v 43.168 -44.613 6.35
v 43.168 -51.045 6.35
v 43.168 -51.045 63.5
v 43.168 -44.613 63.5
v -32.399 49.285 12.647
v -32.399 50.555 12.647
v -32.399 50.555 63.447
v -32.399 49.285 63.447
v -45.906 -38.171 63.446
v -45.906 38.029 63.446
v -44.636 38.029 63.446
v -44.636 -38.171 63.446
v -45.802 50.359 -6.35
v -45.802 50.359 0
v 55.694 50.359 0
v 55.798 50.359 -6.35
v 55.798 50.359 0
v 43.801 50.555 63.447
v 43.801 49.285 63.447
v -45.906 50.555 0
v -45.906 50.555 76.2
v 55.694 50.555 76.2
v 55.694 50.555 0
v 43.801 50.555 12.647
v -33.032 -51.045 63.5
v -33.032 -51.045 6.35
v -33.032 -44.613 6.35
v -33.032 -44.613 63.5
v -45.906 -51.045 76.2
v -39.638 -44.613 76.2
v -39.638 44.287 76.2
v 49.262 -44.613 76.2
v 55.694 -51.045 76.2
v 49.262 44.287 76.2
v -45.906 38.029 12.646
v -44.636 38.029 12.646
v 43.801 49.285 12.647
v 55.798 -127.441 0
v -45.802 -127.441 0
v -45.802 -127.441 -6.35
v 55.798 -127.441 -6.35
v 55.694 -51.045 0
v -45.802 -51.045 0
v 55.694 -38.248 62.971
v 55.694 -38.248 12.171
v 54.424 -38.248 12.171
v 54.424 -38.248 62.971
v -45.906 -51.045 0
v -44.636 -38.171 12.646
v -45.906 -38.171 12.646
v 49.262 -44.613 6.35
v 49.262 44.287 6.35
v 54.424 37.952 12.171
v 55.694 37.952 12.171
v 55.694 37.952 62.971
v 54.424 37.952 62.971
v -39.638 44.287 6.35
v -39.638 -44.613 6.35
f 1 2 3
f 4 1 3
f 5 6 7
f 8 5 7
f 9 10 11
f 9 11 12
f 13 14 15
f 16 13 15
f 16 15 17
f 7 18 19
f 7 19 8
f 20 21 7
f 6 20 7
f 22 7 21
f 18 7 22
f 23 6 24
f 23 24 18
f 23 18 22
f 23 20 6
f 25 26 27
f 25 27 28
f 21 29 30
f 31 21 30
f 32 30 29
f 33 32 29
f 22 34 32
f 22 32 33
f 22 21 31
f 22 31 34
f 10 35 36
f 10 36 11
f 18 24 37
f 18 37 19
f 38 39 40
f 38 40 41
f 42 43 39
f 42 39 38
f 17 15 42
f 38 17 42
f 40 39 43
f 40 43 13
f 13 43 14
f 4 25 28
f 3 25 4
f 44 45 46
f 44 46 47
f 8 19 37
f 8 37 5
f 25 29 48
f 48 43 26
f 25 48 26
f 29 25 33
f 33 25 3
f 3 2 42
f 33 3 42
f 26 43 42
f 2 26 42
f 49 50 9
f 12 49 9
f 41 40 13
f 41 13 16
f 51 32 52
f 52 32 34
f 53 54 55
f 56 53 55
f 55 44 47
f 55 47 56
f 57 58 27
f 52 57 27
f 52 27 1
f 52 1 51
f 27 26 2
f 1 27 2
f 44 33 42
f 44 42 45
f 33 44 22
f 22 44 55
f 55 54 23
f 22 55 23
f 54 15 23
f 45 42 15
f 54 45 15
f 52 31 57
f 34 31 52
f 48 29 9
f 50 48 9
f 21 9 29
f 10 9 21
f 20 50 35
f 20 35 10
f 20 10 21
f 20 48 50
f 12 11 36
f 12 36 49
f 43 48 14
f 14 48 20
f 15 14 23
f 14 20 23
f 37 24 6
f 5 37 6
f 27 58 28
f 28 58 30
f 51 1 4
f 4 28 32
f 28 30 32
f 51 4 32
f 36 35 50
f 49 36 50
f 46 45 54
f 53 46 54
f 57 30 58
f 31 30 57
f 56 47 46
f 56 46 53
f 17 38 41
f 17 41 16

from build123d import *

# Parameters (mm, degrees)
F0_W      = 101.6
F0_H      = 101.599996
F1_DEPTH  = 76.2
F2_W      = 88.9
F2_H      = 88.9
F3_DEPTH  = 69.85
F4_W      = 76.2
F4_H      = 57.15
F5_DEPTH  = 12.7
F6_W      = 76.2
F6_H      = 50.8
F7_DEPTH  = 1.27
F8_W      = 76.2
F8_H      = 50.8
F9_DEPTH  = 1.27
F10_W     = 76.2
F10_H     = 50.8
F11_DEPTH = 1.27
F12_W     = 101.6
F12_H     = 177.8
F13_DEPTH = 6.35


with BuildPart() as f1:
    # F0 (on Top) → F1 (new body)
    with BuildSketch(Plane.XY):
        with Locations((4.893579, -0.244679)):
            Rectangle(F0_W, F0_H)
    extrude(amount=F1_DEPTH)

    # F2 (on face) → F3 (cut)
    with BuildSketch(Plane.XY.offset(76.2)):
        with Locations((4.812017, -0.163119)):
            Rectangle(F2_W, F2_H)
    extrude(amount=-F3_DEPTH, mode=Mode.SUBTRACT)

    # F4 (on face) → F5 (cut)
    with BuildSketch(Plane.XZ.offset(51.044677)):
        with Locations((5.06835, 34.925)):
            Rectangle(F4_W, F4_H)
    extrude(amount=-F5_DEPTH, mode=Mode.SUBTRACT)

    # F6 (on face) → F7 (cut)
    with BuildSketch(Plane(origin=(-45.906421, 0, 0), x_dir=(0, -1, 0), z_dir=(-1, 0, 0))):
        with Locations((0.071097, 38.046492)):
            Rectangle(F6_W, F6_H)
    extrude(amount=-F7_DEPTH, mode=Mode.SUBTRACT)

    # F8 (on face) → F9 (cut)
    with BuildSketch(Plane(origin=(0, 50.555319, 0), x_dir=(-1, 0, 0), z_dir=(0, 1, 0))):
        with Locations((-5.701129, 38.046894)):
            Rectangle(F8_W, F8_H)
    extrude(amount=-F9_DEPTH, mode=Mode.SUBTRACT)

    # F10 (on face) → F11 (cut)
    with BuildSketch(Plane.YZ.offset(55.693579)):
        with Locations((-0.148215, 37.570929)):
            Rectangle(F10_W, F10_H)
    extrude(amount=-F11_DEPTH, mode=Mode.SUBTRACT)

    # F12 (on Top) → F13 (join)
    with BuildSketch(Plane.XY):
        with Locations((4.99807, -38.540878)):
            Rectangle(F12_W, F12_H)
    extrude(amount=-F13_DEPTH)


solid = f1.part
